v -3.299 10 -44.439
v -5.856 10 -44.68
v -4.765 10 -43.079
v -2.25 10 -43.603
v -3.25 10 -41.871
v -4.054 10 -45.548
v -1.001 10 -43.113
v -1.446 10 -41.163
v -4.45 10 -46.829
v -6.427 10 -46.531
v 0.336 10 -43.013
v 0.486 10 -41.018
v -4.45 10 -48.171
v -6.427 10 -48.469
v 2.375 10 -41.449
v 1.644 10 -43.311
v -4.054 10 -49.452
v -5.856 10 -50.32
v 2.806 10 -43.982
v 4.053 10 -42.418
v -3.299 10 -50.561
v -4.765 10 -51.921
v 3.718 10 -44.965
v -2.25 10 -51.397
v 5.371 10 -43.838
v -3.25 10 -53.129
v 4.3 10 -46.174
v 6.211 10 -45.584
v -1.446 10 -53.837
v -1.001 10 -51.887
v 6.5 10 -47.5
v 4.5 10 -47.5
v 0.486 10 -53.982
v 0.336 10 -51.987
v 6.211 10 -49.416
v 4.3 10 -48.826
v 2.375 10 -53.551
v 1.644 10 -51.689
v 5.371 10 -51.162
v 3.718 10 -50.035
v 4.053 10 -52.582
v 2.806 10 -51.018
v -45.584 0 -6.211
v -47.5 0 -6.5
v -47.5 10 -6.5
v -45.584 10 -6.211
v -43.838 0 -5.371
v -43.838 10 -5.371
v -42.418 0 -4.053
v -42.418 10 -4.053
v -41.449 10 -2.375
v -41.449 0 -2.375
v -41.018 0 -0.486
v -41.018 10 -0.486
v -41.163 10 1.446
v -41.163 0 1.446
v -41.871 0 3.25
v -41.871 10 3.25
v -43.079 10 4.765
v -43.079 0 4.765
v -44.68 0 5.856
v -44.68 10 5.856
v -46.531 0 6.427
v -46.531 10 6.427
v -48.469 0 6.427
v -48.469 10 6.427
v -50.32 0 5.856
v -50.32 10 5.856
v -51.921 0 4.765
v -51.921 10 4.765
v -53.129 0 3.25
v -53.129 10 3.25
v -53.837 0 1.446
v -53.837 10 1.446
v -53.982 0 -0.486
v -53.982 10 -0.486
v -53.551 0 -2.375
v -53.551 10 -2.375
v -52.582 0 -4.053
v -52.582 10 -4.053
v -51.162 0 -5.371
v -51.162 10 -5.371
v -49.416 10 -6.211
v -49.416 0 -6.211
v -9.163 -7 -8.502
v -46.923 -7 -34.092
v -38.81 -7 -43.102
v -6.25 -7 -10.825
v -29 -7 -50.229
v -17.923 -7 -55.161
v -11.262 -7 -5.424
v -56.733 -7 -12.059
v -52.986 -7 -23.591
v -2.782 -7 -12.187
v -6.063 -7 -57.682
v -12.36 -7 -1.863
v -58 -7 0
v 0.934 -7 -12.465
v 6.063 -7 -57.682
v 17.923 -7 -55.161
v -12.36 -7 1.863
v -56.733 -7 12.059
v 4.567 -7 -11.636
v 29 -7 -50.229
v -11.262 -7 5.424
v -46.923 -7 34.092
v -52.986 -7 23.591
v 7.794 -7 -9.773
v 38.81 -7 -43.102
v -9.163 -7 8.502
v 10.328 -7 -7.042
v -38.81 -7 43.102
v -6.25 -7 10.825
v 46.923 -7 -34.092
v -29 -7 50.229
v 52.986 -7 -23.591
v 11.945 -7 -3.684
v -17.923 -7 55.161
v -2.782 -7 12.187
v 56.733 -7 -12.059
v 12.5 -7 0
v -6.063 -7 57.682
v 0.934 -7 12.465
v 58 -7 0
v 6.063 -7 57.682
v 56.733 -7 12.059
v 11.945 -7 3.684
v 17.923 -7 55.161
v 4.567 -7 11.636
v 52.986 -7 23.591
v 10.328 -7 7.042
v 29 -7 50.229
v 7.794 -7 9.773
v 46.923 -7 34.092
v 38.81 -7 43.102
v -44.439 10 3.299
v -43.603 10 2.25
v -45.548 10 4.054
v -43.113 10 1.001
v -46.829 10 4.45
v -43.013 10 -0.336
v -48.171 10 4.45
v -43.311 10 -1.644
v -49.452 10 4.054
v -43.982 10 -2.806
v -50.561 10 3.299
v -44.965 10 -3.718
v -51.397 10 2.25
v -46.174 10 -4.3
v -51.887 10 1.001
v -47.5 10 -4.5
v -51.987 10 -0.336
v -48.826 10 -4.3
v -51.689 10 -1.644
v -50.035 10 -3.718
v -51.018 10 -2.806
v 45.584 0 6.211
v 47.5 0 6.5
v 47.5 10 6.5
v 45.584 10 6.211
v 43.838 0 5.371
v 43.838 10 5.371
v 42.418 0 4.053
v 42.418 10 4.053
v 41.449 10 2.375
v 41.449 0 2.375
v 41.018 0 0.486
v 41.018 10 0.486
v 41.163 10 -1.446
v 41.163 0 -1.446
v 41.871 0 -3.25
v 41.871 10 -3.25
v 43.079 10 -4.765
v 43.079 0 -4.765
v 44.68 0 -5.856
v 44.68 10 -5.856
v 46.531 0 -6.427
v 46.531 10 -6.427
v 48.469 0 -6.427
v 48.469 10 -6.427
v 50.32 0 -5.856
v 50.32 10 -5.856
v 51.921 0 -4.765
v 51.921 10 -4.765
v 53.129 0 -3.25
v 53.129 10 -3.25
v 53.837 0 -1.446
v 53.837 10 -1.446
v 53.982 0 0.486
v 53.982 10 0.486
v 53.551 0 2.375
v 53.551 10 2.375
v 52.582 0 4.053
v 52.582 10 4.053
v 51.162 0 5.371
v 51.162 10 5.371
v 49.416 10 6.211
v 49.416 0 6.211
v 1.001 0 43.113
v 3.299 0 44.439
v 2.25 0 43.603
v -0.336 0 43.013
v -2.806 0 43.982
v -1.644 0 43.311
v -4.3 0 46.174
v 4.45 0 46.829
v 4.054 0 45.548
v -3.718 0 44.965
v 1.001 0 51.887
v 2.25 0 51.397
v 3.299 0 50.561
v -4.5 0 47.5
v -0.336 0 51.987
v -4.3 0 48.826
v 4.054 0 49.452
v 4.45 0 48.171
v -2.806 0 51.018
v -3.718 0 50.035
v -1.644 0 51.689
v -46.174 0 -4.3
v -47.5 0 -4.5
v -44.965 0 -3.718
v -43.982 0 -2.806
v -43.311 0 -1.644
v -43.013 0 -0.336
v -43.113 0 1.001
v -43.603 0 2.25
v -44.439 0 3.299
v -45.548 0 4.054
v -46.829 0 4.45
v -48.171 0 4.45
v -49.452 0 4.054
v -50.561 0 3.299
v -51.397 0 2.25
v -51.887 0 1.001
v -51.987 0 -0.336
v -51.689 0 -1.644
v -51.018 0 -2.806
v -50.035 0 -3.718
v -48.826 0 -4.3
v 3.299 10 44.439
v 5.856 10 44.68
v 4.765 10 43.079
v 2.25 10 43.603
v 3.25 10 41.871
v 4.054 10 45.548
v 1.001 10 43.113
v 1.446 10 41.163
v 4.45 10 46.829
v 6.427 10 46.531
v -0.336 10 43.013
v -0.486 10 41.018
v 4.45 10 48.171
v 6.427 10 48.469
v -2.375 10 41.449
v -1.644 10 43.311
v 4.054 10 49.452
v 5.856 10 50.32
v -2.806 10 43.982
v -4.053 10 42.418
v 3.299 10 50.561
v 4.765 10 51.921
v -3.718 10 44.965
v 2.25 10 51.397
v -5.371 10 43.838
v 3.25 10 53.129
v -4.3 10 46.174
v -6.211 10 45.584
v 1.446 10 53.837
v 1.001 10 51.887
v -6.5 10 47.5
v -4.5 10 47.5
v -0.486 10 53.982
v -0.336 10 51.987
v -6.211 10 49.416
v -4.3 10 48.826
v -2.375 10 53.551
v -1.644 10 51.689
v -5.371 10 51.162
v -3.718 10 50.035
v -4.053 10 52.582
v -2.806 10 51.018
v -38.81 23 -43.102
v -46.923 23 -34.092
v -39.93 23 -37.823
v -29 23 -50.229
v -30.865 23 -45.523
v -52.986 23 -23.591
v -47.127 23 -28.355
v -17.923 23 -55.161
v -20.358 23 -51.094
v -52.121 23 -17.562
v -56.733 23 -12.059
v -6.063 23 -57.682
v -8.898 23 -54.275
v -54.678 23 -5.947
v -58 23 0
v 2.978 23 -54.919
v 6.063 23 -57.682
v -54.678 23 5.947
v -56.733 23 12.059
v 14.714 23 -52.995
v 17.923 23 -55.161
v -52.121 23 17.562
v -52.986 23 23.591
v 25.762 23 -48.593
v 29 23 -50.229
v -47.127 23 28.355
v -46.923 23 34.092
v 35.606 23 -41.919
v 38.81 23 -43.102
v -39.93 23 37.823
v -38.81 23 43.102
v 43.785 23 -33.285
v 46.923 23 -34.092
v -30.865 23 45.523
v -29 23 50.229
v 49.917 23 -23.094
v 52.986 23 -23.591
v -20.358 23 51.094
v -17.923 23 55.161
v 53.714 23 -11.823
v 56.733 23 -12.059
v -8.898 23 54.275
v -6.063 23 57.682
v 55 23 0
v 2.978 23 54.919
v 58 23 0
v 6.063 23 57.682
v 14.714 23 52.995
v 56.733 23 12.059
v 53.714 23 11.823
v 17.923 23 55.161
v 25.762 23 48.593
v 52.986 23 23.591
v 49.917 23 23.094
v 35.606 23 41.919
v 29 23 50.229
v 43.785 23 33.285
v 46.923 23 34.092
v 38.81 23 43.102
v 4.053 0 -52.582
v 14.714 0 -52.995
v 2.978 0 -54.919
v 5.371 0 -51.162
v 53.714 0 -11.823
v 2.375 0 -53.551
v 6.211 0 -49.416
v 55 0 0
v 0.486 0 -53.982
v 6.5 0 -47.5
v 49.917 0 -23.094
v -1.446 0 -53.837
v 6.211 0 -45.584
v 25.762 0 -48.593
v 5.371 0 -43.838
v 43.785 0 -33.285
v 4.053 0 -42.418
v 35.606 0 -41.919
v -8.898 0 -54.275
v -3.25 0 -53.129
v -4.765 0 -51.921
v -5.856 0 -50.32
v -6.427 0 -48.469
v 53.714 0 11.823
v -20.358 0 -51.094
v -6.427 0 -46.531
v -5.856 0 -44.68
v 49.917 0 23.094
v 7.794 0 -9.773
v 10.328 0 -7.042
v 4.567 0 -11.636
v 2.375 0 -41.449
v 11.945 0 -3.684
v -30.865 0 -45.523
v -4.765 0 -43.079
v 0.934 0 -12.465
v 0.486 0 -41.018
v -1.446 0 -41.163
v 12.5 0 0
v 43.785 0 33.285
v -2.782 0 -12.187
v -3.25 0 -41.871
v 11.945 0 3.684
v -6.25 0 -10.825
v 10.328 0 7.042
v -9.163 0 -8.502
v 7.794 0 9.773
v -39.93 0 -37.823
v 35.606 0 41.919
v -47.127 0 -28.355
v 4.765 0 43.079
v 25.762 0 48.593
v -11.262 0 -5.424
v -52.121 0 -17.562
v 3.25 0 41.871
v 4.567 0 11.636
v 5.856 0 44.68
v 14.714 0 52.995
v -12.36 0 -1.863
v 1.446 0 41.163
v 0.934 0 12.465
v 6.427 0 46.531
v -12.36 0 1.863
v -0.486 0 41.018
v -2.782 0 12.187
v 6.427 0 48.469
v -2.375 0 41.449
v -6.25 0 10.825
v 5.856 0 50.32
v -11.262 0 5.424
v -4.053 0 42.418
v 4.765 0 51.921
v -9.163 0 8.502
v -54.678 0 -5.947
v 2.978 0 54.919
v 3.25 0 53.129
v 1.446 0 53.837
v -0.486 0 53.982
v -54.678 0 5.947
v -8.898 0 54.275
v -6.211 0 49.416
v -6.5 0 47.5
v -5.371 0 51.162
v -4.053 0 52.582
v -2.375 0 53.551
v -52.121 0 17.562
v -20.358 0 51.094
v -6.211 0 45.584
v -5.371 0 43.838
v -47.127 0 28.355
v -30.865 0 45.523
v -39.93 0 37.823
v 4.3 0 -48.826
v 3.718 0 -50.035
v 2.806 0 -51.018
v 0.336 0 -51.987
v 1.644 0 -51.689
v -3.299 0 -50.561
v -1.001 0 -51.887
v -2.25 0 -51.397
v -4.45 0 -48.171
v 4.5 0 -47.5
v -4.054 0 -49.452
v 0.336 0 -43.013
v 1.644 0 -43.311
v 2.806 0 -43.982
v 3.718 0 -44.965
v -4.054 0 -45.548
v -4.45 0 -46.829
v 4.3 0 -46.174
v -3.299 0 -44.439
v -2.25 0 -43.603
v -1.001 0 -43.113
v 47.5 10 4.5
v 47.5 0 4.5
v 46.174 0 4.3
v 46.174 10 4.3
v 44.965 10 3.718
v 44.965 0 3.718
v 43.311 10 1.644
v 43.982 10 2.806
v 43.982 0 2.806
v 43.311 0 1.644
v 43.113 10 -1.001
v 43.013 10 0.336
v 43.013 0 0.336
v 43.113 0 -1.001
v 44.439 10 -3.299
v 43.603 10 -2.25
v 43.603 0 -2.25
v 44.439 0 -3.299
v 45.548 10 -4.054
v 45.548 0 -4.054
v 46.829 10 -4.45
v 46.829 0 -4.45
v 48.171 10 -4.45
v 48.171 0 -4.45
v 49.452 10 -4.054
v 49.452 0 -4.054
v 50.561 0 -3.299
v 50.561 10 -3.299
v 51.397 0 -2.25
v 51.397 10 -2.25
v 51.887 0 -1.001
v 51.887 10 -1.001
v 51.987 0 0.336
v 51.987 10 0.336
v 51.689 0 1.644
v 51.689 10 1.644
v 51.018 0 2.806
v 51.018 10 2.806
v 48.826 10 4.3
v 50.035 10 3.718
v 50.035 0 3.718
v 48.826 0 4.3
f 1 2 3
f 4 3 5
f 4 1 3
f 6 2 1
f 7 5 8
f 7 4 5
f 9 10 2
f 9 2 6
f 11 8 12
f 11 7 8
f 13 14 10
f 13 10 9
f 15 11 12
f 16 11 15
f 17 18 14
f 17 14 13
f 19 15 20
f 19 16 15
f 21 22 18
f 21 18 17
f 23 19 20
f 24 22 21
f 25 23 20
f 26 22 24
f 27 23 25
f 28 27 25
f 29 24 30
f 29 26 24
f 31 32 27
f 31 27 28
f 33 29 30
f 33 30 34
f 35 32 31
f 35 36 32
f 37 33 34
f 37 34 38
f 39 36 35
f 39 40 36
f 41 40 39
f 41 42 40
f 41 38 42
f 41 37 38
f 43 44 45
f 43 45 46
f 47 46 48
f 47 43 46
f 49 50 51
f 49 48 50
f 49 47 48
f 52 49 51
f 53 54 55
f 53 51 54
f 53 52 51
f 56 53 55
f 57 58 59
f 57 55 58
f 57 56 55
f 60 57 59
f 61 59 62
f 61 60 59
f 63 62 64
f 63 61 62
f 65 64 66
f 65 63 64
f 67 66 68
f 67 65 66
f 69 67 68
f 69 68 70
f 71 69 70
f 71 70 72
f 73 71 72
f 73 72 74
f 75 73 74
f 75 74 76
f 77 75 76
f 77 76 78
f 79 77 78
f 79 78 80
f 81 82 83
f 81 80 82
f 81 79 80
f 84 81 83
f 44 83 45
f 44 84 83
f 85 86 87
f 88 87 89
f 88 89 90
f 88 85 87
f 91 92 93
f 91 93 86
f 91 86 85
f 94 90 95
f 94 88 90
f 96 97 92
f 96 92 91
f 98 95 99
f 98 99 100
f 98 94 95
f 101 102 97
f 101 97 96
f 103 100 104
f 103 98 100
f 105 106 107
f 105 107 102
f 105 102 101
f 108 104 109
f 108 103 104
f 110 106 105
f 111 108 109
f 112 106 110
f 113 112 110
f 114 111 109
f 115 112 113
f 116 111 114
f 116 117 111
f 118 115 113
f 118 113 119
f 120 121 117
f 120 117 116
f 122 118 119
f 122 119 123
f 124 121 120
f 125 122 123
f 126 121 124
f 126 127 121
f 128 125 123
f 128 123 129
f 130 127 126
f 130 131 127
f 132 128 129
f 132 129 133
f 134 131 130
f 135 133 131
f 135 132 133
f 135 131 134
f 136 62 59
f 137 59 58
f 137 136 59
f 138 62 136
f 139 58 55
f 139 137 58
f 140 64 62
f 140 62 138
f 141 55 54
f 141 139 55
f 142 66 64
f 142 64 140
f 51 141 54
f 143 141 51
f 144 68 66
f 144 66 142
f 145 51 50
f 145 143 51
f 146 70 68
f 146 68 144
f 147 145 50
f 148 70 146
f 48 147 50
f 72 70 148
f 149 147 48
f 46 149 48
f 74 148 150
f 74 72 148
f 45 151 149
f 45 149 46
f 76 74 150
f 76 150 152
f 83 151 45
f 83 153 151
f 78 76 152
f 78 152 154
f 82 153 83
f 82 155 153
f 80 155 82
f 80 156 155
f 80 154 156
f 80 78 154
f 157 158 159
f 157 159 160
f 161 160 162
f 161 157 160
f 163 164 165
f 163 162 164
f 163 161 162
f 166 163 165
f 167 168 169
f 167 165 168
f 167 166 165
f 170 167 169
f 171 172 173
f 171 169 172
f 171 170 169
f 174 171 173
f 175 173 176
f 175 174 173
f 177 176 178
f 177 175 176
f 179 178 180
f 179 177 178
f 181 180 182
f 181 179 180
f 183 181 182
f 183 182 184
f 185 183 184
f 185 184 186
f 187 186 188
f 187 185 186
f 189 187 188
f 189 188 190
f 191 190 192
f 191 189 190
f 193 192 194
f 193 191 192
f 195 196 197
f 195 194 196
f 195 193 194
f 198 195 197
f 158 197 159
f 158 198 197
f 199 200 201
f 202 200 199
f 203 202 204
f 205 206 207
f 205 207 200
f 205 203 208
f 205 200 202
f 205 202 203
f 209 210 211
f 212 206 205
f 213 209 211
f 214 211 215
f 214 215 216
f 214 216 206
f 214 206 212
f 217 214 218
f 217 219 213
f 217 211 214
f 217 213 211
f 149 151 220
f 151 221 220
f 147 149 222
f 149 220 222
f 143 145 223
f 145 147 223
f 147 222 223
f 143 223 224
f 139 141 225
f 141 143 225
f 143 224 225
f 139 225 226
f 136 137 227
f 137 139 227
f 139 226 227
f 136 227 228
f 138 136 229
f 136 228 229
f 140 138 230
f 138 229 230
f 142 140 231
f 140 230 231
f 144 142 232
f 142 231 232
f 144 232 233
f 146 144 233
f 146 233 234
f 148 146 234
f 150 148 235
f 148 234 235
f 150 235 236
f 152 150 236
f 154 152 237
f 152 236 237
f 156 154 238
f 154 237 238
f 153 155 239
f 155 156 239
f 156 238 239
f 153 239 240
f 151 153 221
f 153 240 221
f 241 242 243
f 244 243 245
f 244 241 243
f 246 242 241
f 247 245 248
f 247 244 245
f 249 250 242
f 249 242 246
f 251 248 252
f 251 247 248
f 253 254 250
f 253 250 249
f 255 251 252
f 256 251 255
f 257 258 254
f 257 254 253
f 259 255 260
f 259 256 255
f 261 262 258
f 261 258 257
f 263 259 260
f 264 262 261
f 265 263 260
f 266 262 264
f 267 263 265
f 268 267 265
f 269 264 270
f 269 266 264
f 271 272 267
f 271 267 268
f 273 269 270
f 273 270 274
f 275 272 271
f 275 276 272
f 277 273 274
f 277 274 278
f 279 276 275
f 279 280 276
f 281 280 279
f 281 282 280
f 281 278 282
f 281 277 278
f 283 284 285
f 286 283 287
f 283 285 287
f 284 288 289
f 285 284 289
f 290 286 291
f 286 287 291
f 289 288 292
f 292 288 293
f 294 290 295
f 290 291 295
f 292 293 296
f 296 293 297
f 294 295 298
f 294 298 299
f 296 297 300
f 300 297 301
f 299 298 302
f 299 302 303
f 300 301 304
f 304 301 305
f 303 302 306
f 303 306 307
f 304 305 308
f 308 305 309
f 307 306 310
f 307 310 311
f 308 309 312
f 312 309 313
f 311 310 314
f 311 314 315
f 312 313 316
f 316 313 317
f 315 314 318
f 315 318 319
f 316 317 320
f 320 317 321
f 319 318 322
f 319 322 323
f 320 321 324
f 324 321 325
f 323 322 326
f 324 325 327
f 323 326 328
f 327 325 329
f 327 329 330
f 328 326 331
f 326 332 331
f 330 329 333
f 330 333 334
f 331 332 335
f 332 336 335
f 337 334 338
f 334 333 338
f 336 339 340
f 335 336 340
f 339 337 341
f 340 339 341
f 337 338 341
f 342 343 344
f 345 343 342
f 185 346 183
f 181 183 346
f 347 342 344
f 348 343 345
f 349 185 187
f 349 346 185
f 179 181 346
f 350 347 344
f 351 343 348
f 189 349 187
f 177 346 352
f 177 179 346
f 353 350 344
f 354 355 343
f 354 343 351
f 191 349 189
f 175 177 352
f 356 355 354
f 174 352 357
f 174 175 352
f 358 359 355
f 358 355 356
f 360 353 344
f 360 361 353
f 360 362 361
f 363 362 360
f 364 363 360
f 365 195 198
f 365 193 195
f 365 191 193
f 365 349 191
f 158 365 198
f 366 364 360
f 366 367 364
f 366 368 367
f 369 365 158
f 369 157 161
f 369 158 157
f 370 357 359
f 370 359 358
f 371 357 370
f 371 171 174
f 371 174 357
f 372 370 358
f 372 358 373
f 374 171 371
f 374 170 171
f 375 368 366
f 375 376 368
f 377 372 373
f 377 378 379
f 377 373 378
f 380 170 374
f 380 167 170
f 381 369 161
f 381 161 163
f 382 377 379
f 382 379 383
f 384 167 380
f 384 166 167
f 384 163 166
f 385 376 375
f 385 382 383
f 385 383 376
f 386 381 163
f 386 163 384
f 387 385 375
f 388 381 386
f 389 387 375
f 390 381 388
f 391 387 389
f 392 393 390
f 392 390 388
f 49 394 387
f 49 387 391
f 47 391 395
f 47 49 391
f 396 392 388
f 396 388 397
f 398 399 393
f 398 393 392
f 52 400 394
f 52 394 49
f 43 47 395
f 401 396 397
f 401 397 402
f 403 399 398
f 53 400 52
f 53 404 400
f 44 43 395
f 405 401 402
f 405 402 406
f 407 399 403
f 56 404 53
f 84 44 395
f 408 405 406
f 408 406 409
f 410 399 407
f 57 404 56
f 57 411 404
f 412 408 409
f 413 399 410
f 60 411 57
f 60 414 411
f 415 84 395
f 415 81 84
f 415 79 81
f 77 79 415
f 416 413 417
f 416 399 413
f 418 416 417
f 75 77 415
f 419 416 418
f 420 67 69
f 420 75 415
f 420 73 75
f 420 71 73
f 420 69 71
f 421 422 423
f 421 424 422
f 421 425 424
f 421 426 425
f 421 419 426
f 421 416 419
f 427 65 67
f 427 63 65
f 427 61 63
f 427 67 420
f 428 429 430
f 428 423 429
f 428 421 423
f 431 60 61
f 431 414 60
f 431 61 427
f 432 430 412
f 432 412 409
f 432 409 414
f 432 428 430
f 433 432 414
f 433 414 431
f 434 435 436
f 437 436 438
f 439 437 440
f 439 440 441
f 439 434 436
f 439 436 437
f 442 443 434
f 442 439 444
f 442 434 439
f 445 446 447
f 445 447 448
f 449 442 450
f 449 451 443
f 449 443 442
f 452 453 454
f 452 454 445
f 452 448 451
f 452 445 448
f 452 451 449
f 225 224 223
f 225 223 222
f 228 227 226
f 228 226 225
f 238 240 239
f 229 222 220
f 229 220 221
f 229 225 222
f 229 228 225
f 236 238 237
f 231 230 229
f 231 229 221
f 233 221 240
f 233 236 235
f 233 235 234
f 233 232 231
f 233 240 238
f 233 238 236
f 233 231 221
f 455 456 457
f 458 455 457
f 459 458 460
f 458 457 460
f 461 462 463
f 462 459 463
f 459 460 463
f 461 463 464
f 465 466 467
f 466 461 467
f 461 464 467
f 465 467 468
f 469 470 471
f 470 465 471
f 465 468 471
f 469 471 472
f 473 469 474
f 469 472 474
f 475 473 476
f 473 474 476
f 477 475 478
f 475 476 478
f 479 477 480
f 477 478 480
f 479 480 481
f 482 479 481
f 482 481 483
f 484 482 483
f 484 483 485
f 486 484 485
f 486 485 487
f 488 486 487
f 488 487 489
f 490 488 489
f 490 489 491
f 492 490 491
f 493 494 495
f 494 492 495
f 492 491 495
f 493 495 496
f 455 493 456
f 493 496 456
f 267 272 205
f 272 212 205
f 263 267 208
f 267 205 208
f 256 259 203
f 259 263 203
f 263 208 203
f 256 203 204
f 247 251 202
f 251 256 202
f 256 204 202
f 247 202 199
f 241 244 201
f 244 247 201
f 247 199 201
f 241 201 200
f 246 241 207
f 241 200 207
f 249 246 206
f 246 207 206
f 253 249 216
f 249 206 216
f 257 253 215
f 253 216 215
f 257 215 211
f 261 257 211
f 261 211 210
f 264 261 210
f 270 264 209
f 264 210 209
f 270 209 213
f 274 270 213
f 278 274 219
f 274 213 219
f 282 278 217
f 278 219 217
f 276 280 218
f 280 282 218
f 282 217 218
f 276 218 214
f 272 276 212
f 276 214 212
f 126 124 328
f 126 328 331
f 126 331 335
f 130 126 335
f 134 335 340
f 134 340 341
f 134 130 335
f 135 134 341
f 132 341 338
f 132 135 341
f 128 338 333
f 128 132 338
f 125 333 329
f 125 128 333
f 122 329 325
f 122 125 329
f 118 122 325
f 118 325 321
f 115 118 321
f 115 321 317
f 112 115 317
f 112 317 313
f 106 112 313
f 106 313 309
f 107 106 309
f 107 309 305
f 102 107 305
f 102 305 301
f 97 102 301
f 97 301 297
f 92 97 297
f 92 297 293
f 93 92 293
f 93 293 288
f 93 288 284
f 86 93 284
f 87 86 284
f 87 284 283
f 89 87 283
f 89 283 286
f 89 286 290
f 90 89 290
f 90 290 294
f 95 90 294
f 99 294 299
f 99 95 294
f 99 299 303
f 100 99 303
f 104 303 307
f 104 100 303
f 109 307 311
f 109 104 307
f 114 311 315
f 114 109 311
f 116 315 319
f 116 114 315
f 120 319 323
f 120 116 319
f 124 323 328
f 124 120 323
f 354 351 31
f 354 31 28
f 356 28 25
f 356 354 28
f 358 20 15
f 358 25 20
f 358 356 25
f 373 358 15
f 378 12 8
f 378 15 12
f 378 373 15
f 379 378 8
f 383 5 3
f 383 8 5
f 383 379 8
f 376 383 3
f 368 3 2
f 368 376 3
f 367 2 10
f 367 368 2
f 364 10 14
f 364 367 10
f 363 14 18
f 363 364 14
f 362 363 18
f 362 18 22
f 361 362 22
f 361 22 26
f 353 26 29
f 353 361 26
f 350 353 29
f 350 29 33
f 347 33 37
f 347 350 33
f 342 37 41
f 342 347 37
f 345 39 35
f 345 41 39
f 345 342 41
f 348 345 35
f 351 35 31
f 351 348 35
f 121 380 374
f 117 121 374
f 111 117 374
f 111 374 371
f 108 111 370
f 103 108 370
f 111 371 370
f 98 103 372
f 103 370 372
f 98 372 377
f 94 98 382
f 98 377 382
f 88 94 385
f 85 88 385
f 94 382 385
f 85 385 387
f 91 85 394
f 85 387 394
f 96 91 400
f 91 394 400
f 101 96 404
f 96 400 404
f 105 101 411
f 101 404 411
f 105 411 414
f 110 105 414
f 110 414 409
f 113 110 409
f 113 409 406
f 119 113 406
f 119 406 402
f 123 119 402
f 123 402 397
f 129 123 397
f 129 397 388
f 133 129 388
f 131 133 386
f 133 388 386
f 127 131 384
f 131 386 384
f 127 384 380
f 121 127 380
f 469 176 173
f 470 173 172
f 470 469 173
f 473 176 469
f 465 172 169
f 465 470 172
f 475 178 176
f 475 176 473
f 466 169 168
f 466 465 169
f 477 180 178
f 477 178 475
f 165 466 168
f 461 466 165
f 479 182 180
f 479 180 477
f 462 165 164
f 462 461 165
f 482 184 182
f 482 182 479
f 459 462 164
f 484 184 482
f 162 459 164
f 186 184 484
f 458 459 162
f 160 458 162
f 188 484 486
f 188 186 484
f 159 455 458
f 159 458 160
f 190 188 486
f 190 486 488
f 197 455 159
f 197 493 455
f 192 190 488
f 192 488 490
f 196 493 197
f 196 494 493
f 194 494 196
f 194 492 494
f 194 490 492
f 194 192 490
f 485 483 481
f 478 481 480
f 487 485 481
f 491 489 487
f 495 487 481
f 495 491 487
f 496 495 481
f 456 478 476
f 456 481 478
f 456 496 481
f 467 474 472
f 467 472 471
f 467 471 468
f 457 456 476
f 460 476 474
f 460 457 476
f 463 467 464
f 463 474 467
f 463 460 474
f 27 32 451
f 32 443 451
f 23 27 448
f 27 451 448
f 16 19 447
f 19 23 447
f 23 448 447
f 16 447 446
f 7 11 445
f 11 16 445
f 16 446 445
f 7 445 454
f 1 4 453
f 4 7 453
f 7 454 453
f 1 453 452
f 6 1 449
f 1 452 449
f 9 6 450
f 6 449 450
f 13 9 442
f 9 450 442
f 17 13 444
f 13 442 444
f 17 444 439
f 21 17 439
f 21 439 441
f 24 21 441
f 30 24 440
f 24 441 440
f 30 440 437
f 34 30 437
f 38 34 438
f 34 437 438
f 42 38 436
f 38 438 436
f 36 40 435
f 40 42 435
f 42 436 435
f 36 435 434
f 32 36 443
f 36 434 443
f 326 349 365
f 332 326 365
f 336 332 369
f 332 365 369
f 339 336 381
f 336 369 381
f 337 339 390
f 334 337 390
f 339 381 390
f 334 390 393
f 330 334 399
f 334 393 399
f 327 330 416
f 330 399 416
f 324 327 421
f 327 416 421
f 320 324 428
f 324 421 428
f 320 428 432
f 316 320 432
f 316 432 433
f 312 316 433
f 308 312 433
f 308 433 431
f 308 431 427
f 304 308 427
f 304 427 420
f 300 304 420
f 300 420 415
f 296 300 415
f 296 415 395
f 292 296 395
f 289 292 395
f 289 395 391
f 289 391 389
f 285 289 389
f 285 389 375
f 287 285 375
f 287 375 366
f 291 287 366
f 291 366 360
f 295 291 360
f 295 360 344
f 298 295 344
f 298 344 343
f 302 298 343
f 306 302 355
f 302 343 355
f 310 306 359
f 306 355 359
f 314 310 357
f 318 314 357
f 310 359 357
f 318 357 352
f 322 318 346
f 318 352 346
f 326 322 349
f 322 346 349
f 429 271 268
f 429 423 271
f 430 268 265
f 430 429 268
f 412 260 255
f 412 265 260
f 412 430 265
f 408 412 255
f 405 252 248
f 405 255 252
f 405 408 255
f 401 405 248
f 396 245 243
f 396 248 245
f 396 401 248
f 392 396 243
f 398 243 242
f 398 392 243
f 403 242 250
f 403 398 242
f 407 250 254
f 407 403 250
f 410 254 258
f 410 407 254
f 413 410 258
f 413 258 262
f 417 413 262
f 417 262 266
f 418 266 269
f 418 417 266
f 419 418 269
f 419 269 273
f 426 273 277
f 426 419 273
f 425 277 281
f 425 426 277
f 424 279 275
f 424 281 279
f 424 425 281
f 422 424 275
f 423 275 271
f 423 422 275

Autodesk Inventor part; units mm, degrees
ref_plane "YZ Plane" through (0, 0, 0) normal (1, 0, 0) x (0, 1, 0)
ref_plane "XZ Plane" through (0, 0, 0) normal (0, 1, 0) x (-1, 0, 0)
ref_plane "XY Plane" through (0, 0, 0) normal (0, 0, 1) x (1, 0, 0)
sketch "Sketch1" plane through (0, 0, 0) normal (0, 1, 0) x (-1, 0, 0)
  circle A0 centre (0, 0) radius 55
  dimension "d4" = 110
sketch "Sketch2" plane through (0, 0, 0) normal (0, 1, 0) x (-1, 0, 0)
  circle A0 centre (0, 0) radius 40 construction
  circle A1 centre (0, 0) radius 47.5 construction
  circle A2 centre (0, 47.5) radius 4.5
  circle A3 centre (0, 47.5) radius 6.5
  dimension "d11" = 95
  dimension "d10" = 80
  dimension "d12" = 9
  dimension "d13" = 13
extrude "Extrusion1" add sketch "Sketch1" against normal blind 7
extrude "Extrusion2" add sketch "Sketch2" along normal blind 10
pattern_circular "Circular Pattern1" count 4 over 360 about axis through (0, -10, 0) along (0, 1, 0) of "Extrusion2"
sketch "Sketch3" plane through (0, -7, 0) normal (0, -1, 0) x (1, 0, 0)
  circle A0 centre (0, 0) radius 55
  circle A1 centre (0, 0) radius 55 projected
  circle A2 centre (0, 0) radius 58
  dimension "d21" = 116
extrude "Extrusion3" add sketch "Sketch3" against normal blind 30
sketch "Sketch4" plane through (0, 0, 0) normal (0, 1, 0) x (1, 0, 0)
  circle A0 centre (0, 0) radius 12.5
  dimension "d24" = 25
extrude "Extrusion4" cut sketch "Sketch4" against normal blind 30
properties part number "BaseHumedadDireccion"
